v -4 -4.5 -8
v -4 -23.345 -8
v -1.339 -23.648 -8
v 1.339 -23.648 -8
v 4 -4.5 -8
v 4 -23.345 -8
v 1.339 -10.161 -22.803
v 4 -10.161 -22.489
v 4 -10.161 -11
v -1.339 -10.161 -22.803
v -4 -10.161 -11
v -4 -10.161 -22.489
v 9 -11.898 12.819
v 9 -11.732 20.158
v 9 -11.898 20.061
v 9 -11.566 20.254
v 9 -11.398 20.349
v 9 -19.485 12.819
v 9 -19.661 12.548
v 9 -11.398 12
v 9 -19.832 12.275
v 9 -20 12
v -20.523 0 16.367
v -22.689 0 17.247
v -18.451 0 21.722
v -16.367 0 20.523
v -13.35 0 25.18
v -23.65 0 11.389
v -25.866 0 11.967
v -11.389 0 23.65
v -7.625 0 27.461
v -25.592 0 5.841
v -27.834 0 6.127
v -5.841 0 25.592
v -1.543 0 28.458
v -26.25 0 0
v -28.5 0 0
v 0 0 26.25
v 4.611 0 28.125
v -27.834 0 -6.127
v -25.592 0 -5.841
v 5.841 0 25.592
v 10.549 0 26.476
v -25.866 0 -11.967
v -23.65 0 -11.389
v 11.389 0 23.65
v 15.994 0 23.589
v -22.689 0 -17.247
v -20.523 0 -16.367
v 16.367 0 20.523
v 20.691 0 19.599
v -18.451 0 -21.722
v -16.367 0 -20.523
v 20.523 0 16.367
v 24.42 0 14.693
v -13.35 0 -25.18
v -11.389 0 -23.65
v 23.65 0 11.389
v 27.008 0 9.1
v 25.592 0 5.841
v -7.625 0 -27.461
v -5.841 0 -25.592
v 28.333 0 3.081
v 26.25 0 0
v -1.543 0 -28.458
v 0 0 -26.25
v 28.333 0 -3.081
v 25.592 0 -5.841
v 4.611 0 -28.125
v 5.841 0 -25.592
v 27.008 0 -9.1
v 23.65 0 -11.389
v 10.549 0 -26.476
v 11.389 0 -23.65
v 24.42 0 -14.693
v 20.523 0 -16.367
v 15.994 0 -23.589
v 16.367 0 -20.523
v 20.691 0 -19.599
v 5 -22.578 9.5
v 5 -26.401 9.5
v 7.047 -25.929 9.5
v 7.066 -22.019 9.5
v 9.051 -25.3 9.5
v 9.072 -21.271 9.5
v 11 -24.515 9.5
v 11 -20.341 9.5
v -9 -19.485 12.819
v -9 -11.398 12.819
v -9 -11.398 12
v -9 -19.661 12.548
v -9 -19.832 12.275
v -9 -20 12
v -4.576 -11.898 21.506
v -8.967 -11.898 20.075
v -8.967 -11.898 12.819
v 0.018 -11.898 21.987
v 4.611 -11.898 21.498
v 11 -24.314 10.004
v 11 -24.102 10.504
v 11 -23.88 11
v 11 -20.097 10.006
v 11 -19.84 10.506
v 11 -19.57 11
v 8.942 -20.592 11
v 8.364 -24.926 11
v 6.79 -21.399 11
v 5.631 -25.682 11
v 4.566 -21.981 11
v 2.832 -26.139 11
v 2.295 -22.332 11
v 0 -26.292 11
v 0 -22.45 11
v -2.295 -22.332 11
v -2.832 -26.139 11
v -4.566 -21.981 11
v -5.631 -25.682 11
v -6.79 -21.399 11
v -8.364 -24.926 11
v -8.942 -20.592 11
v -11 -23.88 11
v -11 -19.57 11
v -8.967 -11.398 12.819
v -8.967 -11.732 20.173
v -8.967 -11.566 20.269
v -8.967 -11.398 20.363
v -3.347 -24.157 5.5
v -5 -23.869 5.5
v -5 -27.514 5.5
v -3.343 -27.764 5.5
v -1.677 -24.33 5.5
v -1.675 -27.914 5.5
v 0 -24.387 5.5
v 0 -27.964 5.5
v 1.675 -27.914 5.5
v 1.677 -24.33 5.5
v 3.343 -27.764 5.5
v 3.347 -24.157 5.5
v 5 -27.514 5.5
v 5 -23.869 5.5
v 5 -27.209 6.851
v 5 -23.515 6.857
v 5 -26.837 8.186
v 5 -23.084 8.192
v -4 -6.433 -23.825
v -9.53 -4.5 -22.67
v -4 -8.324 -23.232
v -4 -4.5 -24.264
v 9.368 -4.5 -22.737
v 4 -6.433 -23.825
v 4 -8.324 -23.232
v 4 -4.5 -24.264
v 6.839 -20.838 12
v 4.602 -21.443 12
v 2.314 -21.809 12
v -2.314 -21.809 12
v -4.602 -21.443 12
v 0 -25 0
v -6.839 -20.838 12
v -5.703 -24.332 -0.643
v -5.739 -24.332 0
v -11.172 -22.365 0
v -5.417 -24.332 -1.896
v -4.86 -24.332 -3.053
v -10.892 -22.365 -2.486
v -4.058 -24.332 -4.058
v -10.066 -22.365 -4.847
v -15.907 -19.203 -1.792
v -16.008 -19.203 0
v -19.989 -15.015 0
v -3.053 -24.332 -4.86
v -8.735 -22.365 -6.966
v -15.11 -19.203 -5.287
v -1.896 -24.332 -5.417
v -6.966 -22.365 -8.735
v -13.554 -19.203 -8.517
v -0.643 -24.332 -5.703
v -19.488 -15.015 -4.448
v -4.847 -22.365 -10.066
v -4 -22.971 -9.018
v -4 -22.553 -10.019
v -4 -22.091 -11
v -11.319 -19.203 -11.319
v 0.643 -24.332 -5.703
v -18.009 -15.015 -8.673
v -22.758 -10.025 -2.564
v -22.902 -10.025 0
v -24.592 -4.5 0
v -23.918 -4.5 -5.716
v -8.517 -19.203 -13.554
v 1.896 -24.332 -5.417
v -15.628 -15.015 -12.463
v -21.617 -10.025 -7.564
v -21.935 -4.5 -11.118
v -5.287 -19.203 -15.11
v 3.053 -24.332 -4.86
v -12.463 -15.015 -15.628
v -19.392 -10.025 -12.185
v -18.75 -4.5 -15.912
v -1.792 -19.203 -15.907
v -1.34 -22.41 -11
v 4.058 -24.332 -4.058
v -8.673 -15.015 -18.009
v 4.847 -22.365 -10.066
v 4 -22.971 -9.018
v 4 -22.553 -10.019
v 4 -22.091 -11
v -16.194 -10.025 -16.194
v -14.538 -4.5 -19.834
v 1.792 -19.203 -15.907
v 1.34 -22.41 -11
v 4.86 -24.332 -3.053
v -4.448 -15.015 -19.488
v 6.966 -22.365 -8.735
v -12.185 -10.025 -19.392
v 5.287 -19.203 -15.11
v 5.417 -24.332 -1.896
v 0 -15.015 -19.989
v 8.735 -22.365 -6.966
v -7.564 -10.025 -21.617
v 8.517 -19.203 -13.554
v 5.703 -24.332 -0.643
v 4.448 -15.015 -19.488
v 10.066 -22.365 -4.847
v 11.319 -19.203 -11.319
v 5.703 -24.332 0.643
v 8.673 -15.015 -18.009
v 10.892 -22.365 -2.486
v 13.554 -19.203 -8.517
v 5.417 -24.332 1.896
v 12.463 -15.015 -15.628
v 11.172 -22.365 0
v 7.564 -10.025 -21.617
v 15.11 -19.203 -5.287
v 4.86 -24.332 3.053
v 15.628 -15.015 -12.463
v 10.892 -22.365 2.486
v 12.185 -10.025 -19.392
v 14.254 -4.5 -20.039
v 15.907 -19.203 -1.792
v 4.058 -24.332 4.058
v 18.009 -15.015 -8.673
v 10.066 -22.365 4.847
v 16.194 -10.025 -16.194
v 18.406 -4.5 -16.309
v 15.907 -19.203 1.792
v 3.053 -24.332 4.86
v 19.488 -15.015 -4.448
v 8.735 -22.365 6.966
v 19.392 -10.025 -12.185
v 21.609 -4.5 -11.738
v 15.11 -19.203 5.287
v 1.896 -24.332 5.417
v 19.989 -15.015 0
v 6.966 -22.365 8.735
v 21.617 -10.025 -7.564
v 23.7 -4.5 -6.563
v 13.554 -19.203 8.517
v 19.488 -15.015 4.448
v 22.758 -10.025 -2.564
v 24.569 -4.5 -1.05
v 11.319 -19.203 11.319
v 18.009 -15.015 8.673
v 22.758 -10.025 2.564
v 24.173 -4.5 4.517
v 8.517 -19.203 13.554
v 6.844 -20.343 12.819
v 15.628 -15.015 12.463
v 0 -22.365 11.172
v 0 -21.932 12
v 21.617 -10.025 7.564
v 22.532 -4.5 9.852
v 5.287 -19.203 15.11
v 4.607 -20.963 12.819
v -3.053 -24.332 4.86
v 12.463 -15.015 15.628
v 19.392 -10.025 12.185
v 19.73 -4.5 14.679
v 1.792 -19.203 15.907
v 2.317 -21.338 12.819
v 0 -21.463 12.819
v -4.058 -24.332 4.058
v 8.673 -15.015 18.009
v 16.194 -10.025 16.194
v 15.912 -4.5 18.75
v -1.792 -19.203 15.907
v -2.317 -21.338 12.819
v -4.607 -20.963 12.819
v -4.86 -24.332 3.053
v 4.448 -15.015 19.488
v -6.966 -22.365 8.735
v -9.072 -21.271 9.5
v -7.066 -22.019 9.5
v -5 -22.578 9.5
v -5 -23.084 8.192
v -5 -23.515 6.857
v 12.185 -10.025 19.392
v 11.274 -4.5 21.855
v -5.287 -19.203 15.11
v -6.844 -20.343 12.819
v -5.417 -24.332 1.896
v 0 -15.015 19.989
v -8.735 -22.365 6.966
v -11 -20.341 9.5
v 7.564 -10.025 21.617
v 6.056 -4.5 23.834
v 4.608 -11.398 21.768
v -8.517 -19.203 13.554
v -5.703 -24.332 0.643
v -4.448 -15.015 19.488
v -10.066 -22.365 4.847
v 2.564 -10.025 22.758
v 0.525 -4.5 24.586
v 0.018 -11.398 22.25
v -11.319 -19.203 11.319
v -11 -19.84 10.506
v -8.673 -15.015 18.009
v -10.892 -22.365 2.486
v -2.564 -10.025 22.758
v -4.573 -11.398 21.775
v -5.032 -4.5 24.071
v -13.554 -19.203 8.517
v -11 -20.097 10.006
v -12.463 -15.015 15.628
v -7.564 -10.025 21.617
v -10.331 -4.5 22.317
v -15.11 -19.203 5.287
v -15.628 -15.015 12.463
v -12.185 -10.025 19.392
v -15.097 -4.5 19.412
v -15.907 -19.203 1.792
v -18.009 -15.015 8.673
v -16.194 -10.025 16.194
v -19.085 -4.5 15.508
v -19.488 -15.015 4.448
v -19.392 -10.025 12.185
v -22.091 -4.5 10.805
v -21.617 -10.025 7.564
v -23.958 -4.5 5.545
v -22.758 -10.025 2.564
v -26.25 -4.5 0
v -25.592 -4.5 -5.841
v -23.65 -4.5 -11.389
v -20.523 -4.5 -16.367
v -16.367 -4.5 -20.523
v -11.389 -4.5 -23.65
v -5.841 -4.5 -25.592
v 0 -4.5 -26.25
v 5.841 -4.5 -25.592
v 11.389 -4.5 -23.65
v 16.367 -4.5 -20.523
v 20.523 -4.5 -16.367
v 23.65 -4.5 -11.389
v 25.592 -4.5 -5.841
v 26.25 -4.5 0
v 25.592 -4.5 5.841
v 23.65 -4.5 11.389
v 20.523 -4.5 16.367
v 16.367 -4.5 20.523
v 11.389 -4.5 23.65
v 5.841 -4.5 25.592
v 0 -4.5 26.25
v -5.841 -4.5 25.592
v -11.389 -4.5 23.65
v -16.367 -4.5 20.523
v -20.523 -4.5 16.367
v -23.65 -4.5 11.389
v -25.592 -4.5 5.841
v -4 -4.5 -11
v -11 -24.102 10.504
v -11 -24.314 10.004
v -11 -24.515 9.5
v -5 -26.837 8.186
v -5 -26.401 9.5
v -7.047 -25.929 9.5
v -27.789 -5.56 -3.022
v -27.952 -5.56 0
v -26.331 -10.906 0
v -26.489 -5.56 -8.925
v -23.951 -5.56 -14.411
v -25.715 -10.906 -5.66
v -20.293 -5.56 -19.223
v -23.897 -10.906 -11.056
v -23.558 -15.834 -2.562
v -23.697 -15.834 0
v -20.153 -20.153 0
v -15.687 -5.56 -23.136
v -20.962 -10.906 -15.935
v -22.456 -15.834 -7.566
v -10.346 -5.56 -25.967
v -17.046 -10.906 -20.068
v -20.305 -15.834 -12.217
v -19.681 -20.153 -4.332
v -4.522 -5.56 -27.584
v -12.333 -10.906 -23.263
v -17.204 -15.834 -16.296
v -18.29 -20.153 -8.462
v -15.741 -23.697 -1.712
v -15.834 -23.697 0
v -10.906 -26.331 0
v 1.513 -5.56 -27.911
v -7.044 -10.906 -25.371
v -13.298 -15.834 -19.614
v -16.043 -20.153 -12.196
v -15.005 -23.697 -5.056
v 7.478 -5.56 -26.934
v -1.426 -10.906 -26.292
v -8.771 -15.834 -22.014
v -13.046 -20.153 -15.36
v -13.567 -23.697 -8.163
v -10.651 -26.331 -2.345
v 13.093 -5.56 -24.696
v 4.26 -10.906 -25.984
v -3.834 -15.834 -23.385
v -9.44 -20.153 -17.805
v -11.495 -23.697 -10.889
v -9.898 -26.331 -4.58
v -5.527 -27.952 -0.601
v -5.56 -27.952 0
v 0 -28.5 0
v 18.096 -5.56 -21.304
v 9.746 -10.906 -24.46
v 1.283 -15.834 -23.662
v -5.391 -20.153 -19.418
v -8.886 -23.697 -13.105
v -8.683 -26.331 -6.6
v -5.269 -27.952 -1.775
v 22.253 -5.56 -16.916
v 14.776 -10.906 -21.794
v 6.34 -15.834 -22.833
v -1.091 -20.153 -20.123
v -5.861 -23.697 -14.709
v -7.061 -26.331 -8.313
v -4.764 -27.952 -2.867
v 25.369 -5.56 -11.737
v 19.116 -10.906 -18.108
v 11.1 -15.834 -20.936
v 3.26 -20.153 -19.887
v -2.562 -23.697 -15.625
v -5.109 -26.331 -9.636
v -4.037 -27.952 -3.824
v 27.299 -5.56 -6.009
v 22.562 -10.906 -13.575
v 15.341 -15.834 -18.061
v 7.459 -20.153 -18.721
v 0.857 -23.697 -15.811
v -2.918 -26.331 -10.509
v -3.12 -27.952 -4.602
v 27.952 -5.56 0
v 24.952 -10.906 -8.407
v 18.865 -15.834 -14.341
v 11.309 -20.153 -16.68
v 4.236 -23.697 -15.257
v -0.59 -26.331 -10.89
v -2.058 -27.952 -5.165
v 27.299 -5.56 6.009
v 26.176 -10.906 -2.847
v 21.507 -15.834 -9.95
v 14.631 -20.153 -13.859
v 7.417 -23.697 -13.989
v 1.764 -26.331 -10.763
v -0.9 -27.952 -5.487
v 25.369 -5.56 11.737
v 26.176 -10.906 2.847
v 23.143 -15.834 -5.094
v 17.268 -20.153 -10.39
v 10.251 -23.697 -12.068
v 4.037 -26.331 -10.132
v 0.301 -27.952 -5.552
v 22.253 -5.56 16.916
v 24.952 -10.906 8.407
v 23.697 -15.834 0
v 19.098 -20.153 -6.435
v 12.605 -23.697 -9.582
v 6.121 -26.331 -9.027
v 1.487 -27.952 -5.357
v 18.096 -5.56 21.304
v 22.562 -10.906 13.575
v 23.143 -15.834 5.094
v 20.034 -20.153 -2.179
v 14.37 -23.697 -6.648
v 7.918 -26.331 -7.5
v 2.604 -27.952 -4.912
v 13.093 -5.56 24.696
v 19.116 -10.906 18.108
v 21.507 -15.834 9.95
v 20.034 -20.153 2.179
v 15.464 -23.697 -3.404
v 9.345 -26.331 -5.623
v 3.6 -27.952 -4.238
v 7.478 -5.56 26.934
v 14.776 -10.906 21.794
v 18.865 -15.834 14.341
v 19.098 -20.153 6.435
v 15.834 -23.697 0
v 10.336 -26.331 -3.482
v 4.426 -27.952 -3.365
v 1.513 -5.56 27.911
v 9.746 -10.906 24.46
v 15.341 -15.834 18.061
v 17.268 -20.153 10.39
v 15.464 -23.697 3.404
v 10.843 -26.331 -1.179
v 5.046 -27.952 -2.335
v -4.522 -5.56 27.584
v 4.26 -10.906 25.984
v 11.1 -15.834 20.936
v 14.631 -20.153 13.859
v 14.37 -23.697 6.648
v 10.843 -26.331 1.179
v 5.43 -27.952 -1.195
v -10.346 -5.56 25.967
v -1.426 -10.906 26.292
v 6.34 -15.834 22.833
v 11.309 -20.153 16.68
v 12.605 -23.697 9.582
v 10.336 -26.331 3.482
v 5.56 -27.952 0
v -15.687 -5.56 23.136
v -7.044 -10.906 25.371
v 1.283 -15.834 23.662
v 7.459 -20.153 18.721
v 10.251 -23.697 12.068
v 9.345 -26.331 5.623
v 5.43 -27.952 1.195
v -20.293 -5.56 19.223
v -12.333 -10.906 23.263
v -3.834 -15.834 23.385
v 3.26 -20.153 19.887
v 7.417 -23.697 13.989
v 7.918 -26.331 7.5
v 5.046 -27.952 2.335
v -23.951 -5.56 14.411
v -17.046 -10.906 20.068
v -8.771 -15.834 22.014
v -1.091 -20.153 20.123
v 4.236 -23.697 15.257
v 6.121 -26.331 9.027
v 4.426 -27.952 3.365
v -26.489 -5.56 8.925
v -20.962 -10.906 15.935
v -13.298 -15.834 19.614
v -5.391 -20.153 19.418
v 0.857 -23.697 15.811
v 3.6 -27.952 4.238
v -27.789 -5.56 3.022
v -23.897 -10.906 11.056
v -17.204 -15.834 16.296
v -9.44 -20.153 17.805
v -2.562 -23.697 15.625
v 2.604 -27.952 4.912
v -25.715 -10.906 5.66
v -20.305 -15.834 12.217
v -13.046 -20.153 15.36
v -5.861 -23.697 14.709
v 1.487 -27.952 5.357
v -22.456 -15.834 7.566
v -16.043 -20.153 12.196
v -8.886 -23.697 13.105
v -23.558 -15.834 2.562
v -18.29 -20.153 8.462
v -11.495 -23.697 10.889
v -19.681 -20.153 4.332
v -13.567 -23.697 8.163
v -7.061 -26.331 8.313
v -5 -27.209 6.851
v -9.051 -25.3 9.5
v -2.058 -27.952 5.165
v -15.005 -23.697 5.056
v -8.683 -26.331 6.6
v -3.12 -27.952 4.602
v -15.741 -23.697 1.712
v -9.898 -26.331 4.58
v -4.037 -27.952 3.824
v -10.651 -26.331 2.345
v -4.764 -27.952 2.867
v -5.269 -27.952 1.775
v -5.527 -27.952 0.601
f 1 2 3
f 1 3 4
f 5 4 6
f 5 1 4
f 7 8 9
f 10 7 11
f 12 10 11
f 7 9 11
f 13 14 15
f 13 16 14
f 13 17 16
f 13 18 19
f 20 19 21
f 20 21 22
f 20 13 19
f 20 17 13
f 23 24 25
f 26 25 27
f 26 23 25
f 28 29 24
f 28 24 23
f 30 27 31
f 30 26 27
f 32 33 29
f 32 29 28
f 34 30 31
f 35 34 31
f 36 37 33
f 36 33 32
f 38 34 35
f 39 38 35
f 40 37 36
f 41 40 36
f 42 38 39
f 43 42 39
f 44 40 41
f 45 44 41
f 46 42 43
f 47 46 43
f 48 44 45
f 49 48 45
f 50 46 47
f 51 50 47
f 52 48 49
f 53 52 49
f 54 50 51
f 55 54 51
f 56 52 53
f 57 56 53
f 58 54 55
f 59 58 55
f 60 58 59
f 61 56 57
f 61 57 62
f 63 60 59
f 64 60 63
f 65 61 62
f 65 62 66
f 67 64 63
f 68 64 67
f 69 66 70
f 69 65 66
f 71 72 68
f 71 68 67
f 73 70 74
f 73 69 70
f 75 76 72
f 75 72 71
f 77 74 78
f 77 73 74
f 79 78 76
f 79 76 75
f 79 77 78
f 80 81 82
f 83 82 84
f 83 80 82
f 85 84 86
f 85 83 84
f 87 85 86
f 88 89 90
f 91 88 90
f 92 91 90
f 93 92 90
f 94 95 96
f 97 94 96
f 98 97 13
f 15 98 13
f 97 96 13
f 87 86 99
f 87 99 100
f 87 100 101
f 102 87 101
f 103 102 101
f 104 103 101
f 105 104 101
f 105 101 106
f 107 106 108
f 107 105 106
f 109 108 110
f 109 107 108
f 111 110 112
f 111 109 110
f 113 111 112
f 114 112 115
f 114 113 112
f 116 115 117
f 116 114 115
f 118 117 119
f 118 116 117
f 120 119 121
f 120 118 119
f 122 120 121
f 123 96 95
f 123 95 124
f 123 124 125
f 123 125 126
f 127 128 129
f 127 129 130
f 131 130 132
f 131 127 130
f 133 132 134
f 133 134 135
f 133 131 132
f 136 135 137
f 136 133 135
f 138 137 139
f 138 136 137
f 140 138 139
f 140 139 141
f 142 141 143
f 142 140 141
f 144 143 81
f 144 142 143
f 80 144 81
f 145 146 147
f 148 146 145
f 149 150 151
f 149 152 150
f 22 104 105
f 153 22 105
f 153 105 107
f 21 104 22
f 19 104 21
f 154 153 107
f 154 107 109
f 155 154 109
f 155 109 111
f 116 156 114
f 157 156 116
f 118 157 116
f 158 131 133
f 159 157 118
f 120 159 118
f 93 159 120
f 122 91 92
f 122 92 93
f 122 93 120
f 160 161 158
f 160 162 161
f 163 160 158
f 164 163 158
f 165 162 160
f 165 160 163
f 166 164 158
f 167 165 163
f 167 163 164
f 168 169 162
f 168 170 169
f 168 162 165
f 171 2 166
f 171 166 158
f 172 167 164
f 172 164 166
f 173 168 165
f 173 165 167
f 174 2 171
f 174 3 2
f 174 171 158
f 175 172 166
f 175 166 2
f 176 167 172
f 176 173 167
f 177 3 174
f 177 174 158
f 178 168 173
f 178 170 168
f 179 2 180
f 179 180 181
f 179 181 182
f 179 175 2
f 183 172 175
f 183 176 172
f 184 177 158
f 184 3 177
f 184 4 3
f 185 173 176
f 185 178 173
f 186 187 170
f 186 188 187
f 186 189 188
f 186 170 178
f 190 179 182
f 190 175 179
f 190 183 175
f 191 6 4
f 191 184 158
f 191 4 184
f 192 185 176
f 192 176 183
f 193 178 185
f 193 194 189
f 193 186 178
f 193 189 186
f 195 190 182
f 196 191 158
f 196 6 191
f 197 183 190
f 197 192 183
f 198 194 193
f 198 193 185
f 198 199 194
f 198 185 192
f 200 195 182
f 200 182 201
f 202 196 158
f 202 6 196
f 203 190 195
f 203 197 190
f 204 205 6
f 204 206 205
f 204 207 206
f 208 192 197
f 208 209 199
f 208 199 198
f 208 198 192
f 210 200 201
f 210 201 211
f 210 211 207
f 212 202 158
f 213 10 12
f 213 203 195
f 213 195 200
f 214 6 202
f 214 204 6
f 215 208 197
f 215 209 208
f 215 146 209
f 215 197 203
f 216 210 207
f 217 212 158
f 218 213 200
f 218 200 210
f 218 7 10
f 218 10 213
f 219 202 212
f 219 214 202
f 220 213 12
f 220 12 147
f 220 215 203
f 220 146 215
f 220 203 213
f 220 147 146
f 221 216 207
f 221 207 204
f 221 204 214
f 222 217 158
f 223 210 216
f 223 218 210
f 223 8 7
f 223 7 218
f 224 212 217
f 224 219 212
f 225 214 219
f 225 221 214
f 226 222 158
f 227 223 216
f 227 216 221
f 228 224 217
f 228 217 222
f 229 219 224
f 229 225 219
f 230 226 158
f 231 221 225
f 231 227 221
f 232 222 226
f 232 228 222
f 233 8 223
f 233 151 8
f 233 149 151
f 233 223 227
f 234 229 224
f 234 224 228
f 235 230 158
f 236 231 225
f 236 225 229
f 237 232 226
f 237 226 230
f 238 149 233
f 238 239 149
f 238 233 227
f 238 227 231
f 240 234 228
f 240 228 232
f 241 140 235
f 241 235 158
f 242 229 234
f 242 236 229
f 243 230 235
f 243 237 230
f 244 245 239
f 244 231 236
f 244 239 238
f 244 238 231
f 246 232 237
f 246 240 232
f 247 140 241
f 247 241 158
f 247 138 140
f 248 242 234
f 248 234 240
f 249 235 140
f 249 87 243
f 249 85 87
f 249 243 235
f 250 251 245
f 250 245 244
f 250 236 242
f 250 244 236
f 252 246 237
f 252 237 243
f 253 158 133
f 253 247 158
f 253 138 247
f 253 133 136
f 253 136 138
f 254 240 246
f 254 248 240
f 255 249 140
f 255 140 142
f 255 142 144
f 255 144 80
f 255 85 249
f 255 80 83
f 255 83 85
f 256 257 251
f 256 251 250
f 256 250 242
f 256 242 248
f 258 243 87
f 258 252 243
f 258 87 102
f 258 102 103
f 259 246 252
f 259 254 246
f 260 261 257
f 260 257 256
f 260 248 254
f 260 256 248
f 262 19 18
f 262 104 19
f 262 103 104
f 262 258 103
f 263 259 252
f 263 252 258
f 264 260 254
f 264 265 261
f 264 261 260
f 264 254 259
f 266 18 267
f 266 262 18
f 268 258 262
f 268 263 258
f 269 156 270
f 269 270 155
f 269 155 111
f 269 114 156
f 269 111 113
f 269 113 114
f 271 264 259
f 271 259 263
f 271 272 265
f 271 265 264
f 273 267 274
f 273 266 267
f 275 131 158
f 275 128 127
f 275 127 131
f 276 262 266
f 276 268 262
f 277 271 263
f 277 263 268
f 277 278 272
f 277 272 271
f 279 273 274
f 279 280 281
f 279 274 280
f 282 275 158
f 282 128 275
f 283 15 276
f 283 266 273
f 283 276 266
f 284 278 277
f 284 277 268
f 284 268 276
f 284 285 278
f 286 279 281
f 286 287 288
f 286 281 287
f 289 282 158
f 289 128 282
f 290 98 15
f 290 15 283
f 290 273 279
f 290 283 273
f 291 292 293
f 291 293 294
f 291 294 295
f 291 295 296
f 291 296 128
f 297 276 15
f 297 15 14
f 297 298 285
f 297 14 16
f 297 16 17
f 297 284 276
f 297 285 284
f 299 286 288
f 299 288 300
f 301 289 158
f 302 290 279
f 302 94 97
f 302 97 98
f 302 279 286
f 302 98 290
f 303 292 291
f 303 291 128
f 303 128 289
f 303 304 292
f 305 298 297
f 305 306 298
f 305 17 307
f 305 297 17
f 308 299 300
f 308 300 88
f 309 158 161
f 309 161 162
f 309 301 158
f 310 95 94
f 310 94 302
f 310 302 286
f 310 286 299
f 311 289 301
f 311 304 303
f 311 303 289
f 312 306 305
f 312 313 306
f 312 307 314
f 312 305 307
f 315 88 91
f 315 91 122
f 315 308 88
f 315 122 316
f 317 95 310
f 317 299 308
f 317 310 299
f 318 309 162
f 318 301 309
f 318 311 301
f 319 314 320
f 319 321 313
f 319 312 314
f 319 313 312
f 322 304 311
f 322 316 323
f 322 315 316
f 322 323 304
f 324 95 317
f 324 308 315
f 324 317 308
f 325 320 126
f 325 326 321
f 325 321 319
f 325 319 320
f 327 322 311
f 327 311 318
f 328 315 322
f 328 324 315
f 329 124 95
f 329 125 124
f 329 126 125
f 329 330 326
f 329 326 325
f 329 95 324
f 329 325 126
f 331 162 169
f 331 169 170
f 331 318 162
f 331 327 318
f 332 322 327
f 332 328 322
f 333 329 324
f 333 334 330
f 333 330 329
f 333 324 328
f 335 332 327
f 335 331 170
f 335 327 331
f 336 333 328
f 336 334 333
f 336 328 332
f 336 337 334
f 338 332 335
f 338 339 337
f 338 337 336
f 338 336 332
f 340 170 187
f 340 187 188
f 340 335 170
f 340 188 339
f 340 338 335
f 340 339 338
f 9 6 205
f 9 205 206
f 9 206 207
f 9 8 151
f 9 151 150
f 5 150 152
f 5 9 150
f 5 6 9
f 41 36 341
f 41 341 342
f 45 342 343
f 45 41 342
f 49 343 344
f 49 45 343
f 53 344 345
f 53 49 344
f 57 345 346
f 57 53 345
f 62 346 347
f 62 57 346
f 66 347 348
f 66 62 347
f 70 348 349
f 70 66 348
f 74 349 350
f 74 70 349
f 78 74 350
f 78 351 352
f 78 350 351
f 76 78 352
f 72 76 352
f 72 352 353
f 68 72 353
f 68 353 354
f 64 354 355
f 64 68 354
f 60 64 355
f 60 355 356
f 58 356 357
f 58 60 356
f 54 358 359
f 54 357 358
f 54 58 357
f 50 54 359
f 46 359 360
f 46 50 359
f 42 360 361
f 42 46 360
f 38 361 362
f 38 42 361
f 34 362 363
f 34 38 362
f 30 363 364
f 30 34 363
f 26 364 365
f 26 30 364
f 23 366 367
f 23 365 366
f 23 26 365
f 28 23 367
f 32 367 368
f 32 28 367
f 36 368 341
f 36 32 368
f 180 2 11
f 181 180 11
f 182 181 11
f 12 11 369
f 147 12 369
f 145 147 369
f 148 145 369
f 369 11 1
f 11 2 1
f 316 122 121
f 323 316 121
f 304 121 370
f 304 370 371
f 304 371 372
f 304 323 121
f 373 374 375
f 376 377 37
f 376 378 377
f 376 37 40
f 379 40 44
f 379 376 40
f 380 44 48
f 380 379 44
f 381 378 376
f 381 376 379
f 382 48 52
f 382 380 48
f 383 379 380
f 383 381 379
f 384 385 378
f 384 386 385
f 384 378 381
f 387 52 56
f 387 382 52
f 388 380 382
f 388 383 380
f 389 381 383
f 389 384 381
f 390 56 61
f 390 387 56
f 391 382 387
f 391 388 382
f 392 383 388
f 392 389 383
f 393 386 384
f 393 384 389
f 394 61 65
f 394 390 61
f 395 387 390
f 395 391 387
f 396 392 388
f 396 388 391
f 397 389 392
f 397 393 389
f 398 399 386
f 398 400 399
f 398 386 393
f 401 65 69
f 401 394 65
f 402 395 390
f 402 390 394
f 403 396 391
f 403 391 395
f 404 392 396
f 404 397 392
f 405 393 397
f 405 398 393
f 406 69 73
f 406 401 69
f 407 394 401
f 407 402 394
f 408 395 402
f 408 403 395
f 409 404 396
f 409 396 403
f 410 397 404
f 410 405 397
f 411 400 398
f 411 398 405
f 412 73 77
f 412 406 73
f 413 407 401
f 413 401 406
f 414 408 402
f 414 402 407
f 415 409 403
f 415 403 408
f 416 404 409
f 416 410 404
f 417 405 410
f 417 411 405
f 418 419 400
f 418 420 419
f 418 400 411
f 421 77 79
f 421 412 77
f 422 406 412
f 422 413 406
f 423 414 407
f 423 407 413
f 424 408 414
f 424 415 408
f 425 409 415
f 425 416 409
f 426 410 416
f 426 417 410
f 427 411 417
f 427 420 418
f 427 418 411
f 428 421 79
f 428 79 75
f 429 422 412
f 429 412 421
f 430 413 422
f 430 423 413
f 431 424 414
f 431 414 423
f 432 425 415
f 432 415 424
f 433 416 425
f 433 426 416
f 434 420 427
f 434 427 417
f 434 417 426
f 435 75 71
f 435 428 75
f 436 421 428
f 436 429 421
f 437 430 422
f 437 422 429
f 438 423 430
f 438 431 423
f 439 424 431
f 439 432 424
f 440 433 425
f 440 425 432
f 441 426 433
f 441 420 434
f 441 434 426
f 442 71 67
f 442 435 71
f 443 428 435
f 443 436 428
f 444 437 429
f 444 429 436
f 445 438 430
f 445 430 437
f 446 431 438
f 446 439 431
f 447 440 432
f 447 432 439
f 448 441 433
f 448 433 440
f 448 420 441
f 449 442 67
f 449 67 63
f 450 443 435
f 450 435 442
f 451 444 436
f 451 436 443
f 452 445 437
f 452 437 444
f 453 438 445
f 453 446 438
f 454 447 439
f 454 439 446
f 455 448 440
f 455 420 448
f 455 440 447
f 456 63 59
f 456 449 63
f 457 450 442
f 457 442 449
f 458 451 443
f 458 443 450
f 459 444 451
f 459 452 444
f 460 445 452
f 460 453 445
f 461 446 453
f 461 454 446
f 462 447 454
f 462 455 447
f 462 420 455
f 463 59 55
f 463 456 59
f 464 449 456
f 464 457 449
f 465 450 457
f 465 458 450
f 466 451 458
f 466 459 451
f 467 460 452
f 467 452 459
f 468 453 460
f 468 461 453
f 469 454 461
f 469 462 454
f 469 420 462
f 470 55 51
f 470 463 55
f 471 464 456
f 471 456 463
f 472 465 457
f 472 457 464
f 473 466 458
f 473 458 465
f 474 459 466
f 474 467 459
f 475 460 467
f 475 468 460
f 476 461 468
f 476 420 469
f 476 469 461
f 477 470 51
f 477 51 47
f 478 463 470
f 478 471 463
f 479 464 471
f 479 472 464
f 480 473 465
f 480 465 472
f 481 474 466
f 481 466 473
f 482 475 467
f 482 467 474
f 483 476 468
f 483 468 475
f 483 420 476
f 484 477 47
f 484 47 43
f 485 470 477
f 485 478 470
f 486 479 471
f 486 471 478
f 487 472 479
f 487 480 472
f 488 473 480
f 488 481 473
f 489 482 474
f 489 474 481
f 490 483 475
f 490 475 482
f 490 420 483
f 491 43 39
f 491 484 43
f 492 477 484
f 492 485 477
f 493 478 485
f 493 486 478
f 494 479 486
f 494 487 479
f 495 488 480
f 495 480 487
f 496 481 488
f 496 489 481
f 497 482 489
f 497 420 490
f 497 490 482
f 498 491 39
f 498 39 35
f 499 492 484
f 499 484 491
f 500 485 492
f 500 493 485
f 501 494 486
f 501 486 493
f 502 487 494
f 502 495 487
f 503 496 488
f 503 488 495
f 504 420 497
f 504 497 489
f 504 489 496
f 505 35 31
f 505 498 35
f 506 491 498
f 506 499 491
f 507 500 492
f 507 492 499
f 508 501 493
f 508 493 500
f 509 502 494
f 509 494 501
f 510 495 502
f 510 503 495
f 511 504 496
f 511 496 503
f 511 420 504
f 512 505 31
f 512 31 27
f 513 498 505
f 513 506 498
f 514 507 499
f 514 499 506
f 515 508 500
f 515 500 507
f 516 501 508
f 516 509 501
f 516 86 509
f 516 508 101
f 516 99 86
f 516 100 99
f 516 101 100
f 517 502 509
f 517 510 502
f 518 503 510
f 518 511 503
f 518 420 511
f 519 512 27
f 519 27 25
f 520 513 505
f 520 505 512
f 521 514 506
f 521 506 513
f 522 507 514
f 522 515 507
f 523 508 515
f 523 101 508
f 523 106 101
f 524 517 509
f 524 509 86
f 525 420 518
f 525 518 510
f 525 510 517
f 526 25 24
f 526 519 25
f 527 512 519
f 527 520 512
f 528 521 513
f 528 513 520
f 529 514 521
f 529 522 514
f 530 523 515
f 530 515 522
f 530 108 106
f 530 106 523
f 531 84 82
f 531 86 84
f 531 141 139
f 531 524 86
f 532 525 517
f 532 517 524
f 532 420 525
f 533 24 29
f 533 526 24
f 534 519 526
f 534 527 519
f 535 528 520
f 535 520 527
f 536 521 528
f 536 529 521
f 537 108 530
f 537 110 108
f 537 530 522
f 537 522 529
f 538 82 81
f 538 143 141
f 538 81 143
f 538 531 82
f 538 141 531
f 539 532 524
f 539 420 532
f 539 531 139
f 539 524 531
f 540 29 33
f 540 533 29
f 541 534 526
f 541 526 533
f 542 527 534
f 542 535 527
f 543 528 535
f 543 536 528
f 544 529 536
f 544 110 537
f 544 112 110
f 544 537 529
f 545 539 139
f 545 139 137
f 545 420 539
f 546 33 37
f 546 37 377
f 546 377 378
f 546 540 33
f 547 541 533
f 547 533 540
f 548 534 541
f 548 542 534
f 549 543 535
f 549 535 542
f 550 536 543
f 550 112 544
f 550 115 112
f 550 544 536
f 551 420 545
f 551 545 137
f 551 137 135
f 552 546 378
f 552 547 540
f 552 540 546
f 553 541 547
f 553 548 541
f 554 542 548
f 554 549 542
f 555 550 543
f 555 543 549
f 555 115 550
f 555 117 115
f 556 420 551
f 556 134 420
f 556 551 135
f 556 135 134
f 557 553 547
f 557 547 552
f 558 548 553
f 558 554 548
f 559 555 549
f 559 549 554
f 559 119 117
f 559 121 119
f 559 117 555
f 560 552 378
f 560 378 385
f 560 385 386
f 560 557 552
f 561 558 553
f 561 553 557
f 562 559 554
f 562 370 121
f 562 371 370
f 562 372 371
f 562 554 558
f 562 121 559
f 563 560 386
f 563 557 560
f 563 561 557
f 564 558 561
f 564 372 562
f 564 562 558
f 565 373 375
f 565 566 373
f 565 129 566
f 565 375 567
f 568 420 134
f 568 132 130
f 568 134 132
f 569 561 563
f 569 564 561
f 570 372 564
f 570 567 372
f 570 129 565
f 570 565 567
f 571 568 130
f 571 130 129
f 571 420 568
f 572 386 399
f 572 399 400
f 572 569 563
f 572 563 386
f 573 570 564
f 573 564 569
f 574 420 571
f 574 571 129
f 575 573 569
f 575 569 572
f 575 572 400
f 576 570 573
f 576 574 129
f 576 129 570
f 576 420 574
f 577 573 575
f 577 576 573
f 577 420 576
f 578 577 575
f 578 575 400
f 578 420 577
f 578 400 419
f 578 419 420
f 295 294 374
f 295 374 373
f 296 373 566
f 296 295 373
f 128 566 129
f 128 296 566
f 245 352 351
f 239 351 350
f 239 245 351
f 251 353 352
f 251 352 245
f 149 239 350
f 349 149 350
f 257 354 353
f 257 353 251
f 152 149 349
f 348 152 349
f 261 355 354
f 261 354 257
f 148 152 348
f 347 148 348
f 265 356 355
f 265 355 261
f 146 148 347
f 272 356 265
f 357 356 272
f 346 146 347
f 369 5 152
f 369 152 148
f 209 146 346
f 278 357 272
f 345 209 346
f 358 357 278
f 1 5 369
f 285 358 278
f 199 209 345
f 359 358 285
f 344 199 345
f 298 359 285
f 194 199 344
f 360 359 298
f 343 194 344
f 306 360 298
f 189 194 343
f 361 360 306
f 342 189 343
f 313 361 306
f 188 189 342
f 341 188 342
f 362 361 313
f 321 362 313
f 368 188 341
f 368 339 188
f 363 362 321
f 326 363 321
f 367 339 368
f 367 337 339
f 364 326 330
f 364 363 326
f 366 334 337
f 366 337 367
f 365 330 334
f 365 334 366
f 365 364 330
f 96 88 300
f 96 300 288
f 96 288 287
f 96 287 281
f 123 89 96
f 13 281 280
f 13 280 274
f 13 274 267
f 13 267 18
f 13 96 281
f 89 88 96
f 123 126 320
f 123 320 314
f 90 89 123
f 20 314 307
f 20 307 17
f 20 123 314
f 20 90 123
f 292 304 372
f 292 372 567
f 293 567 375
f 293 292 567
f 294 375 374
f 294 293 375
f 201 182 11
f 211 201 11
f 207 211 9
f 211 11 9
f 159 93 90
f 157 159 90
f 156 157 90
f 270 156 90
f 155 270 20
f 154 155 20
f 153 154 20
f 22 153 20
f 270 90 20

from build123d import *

# Parameters (mm, degrees)
CUT_EXTRUDE1_DEPTH  = 33
BOSS_EXTRUDE2_START = -6.898371775
SKETCH3_W           = 18
SKETCH3_H           = 0.818990312
BOSS_EXTRUDE2_DEPTH = 10.555064026
SKETCH4_W           = 8
SKETCH4_H           = 3
BOSS_EXTRUDE3_DEPTH = 21
SKETCH6_W           = 8
SKETCH6_H           = 5.661156415
BOSS_EXTRUDE4_DEPTH = 15
SKETCH7_W           = 17.96730976
SKETCH7_H           = 0.5
BOSS_EXTRUDE7_DEPTH = 11


with BuildPart() as part:
    # Sketch1 → Revolve1 (revolve)
    with BuildSketch(Plane.XY):
        with BuildLine():
            Line((-26.25, 0), (-28.5, 0))
            ThreePointArc((-28.5, 0), (-20.152543264, -20.152543264), (0, -28.5))
            Line((0, -28.5), (0, -25))
            ThreePointArc((0, -25), (-16.007810594, -19.20286437), (-24.591665255, -4.5))
            Line((-24.591665255, -4.5), (-26.25, -4.5))
            Line((-26.25, -4.5), (-26.25, 0))
        make_face()
    revolve(axis=Axis((0, 0, 0), (0, -1, 0)))

    # Sketch2 → Cut-Extrude1 (cut)
    with BuildSketch(Plane(origin=(0, 0, 0), x_dir=(1, 0, 0), z_dir=(0, 1, 0))):
        Polygon((-5, -9.5), (-5, -5.5), (5, -5.5), (5, -9.5), (11, -9.5), (11, -11), (-11, -11), (-11, -9.5), align=None)
    extrude(amount=-CUT_EXTRUDE1_DEPTH, mode=Mode.SUBTRACT)

    # Sketch3 → Boss-Extrude2 (add)
    with BuildSketch(Plane(origin=(0, -4.5, 0), x_dir=(1, 0, 0), z_dir=(0, 1, 0)).offset(BOSS_EXTRUDE2_START)):
        with Locations((0, -12.409495156)):
            Rectangle(SKETCH3_W, SKETCH3_H)
    extrude(amount=-BOSS_EXTRUDE2_DEPTH)

    # Sketch4 → Boss-Extrude3 (add)
    with BuildSketch(Plane(origin=(0, -4.5, 0), x_dir=(1, 0, 0), z_dir=(0, 1, 0))):
        with Locations((0, 9.5)):
            Rectangle(SKETCH4_W, SKETCH4_H)
    extrude(amount=-BOSS_EXTRUDE3_DEPTH)

    # Sketch6 → Boss-Extrude4 (add)
    with BuildSketch(Plane(origin=(0, 0, -11), x_dir=(-1, 0, 0), z_dir=(0, 0, -1))):
        with Locations((0, -7.330578208)):
            Rectangle(SKETCH6_W, SKETCH6_H)
    extrude(amount=BOSS_EXTRUDE4_DEPTH)

    # Sketch7 → Boss-Extrude7 (add)
    with BuildSketch(Plane.XY.offset(12.818990312)):
        with Locations((0.01634512, -11.648371775)):
            Rectangle(SKETCH7_W, SKETCH7_H)
    extrude(amount=BOSS_EXTRUDE7_DEPTH)


solid = part.part
